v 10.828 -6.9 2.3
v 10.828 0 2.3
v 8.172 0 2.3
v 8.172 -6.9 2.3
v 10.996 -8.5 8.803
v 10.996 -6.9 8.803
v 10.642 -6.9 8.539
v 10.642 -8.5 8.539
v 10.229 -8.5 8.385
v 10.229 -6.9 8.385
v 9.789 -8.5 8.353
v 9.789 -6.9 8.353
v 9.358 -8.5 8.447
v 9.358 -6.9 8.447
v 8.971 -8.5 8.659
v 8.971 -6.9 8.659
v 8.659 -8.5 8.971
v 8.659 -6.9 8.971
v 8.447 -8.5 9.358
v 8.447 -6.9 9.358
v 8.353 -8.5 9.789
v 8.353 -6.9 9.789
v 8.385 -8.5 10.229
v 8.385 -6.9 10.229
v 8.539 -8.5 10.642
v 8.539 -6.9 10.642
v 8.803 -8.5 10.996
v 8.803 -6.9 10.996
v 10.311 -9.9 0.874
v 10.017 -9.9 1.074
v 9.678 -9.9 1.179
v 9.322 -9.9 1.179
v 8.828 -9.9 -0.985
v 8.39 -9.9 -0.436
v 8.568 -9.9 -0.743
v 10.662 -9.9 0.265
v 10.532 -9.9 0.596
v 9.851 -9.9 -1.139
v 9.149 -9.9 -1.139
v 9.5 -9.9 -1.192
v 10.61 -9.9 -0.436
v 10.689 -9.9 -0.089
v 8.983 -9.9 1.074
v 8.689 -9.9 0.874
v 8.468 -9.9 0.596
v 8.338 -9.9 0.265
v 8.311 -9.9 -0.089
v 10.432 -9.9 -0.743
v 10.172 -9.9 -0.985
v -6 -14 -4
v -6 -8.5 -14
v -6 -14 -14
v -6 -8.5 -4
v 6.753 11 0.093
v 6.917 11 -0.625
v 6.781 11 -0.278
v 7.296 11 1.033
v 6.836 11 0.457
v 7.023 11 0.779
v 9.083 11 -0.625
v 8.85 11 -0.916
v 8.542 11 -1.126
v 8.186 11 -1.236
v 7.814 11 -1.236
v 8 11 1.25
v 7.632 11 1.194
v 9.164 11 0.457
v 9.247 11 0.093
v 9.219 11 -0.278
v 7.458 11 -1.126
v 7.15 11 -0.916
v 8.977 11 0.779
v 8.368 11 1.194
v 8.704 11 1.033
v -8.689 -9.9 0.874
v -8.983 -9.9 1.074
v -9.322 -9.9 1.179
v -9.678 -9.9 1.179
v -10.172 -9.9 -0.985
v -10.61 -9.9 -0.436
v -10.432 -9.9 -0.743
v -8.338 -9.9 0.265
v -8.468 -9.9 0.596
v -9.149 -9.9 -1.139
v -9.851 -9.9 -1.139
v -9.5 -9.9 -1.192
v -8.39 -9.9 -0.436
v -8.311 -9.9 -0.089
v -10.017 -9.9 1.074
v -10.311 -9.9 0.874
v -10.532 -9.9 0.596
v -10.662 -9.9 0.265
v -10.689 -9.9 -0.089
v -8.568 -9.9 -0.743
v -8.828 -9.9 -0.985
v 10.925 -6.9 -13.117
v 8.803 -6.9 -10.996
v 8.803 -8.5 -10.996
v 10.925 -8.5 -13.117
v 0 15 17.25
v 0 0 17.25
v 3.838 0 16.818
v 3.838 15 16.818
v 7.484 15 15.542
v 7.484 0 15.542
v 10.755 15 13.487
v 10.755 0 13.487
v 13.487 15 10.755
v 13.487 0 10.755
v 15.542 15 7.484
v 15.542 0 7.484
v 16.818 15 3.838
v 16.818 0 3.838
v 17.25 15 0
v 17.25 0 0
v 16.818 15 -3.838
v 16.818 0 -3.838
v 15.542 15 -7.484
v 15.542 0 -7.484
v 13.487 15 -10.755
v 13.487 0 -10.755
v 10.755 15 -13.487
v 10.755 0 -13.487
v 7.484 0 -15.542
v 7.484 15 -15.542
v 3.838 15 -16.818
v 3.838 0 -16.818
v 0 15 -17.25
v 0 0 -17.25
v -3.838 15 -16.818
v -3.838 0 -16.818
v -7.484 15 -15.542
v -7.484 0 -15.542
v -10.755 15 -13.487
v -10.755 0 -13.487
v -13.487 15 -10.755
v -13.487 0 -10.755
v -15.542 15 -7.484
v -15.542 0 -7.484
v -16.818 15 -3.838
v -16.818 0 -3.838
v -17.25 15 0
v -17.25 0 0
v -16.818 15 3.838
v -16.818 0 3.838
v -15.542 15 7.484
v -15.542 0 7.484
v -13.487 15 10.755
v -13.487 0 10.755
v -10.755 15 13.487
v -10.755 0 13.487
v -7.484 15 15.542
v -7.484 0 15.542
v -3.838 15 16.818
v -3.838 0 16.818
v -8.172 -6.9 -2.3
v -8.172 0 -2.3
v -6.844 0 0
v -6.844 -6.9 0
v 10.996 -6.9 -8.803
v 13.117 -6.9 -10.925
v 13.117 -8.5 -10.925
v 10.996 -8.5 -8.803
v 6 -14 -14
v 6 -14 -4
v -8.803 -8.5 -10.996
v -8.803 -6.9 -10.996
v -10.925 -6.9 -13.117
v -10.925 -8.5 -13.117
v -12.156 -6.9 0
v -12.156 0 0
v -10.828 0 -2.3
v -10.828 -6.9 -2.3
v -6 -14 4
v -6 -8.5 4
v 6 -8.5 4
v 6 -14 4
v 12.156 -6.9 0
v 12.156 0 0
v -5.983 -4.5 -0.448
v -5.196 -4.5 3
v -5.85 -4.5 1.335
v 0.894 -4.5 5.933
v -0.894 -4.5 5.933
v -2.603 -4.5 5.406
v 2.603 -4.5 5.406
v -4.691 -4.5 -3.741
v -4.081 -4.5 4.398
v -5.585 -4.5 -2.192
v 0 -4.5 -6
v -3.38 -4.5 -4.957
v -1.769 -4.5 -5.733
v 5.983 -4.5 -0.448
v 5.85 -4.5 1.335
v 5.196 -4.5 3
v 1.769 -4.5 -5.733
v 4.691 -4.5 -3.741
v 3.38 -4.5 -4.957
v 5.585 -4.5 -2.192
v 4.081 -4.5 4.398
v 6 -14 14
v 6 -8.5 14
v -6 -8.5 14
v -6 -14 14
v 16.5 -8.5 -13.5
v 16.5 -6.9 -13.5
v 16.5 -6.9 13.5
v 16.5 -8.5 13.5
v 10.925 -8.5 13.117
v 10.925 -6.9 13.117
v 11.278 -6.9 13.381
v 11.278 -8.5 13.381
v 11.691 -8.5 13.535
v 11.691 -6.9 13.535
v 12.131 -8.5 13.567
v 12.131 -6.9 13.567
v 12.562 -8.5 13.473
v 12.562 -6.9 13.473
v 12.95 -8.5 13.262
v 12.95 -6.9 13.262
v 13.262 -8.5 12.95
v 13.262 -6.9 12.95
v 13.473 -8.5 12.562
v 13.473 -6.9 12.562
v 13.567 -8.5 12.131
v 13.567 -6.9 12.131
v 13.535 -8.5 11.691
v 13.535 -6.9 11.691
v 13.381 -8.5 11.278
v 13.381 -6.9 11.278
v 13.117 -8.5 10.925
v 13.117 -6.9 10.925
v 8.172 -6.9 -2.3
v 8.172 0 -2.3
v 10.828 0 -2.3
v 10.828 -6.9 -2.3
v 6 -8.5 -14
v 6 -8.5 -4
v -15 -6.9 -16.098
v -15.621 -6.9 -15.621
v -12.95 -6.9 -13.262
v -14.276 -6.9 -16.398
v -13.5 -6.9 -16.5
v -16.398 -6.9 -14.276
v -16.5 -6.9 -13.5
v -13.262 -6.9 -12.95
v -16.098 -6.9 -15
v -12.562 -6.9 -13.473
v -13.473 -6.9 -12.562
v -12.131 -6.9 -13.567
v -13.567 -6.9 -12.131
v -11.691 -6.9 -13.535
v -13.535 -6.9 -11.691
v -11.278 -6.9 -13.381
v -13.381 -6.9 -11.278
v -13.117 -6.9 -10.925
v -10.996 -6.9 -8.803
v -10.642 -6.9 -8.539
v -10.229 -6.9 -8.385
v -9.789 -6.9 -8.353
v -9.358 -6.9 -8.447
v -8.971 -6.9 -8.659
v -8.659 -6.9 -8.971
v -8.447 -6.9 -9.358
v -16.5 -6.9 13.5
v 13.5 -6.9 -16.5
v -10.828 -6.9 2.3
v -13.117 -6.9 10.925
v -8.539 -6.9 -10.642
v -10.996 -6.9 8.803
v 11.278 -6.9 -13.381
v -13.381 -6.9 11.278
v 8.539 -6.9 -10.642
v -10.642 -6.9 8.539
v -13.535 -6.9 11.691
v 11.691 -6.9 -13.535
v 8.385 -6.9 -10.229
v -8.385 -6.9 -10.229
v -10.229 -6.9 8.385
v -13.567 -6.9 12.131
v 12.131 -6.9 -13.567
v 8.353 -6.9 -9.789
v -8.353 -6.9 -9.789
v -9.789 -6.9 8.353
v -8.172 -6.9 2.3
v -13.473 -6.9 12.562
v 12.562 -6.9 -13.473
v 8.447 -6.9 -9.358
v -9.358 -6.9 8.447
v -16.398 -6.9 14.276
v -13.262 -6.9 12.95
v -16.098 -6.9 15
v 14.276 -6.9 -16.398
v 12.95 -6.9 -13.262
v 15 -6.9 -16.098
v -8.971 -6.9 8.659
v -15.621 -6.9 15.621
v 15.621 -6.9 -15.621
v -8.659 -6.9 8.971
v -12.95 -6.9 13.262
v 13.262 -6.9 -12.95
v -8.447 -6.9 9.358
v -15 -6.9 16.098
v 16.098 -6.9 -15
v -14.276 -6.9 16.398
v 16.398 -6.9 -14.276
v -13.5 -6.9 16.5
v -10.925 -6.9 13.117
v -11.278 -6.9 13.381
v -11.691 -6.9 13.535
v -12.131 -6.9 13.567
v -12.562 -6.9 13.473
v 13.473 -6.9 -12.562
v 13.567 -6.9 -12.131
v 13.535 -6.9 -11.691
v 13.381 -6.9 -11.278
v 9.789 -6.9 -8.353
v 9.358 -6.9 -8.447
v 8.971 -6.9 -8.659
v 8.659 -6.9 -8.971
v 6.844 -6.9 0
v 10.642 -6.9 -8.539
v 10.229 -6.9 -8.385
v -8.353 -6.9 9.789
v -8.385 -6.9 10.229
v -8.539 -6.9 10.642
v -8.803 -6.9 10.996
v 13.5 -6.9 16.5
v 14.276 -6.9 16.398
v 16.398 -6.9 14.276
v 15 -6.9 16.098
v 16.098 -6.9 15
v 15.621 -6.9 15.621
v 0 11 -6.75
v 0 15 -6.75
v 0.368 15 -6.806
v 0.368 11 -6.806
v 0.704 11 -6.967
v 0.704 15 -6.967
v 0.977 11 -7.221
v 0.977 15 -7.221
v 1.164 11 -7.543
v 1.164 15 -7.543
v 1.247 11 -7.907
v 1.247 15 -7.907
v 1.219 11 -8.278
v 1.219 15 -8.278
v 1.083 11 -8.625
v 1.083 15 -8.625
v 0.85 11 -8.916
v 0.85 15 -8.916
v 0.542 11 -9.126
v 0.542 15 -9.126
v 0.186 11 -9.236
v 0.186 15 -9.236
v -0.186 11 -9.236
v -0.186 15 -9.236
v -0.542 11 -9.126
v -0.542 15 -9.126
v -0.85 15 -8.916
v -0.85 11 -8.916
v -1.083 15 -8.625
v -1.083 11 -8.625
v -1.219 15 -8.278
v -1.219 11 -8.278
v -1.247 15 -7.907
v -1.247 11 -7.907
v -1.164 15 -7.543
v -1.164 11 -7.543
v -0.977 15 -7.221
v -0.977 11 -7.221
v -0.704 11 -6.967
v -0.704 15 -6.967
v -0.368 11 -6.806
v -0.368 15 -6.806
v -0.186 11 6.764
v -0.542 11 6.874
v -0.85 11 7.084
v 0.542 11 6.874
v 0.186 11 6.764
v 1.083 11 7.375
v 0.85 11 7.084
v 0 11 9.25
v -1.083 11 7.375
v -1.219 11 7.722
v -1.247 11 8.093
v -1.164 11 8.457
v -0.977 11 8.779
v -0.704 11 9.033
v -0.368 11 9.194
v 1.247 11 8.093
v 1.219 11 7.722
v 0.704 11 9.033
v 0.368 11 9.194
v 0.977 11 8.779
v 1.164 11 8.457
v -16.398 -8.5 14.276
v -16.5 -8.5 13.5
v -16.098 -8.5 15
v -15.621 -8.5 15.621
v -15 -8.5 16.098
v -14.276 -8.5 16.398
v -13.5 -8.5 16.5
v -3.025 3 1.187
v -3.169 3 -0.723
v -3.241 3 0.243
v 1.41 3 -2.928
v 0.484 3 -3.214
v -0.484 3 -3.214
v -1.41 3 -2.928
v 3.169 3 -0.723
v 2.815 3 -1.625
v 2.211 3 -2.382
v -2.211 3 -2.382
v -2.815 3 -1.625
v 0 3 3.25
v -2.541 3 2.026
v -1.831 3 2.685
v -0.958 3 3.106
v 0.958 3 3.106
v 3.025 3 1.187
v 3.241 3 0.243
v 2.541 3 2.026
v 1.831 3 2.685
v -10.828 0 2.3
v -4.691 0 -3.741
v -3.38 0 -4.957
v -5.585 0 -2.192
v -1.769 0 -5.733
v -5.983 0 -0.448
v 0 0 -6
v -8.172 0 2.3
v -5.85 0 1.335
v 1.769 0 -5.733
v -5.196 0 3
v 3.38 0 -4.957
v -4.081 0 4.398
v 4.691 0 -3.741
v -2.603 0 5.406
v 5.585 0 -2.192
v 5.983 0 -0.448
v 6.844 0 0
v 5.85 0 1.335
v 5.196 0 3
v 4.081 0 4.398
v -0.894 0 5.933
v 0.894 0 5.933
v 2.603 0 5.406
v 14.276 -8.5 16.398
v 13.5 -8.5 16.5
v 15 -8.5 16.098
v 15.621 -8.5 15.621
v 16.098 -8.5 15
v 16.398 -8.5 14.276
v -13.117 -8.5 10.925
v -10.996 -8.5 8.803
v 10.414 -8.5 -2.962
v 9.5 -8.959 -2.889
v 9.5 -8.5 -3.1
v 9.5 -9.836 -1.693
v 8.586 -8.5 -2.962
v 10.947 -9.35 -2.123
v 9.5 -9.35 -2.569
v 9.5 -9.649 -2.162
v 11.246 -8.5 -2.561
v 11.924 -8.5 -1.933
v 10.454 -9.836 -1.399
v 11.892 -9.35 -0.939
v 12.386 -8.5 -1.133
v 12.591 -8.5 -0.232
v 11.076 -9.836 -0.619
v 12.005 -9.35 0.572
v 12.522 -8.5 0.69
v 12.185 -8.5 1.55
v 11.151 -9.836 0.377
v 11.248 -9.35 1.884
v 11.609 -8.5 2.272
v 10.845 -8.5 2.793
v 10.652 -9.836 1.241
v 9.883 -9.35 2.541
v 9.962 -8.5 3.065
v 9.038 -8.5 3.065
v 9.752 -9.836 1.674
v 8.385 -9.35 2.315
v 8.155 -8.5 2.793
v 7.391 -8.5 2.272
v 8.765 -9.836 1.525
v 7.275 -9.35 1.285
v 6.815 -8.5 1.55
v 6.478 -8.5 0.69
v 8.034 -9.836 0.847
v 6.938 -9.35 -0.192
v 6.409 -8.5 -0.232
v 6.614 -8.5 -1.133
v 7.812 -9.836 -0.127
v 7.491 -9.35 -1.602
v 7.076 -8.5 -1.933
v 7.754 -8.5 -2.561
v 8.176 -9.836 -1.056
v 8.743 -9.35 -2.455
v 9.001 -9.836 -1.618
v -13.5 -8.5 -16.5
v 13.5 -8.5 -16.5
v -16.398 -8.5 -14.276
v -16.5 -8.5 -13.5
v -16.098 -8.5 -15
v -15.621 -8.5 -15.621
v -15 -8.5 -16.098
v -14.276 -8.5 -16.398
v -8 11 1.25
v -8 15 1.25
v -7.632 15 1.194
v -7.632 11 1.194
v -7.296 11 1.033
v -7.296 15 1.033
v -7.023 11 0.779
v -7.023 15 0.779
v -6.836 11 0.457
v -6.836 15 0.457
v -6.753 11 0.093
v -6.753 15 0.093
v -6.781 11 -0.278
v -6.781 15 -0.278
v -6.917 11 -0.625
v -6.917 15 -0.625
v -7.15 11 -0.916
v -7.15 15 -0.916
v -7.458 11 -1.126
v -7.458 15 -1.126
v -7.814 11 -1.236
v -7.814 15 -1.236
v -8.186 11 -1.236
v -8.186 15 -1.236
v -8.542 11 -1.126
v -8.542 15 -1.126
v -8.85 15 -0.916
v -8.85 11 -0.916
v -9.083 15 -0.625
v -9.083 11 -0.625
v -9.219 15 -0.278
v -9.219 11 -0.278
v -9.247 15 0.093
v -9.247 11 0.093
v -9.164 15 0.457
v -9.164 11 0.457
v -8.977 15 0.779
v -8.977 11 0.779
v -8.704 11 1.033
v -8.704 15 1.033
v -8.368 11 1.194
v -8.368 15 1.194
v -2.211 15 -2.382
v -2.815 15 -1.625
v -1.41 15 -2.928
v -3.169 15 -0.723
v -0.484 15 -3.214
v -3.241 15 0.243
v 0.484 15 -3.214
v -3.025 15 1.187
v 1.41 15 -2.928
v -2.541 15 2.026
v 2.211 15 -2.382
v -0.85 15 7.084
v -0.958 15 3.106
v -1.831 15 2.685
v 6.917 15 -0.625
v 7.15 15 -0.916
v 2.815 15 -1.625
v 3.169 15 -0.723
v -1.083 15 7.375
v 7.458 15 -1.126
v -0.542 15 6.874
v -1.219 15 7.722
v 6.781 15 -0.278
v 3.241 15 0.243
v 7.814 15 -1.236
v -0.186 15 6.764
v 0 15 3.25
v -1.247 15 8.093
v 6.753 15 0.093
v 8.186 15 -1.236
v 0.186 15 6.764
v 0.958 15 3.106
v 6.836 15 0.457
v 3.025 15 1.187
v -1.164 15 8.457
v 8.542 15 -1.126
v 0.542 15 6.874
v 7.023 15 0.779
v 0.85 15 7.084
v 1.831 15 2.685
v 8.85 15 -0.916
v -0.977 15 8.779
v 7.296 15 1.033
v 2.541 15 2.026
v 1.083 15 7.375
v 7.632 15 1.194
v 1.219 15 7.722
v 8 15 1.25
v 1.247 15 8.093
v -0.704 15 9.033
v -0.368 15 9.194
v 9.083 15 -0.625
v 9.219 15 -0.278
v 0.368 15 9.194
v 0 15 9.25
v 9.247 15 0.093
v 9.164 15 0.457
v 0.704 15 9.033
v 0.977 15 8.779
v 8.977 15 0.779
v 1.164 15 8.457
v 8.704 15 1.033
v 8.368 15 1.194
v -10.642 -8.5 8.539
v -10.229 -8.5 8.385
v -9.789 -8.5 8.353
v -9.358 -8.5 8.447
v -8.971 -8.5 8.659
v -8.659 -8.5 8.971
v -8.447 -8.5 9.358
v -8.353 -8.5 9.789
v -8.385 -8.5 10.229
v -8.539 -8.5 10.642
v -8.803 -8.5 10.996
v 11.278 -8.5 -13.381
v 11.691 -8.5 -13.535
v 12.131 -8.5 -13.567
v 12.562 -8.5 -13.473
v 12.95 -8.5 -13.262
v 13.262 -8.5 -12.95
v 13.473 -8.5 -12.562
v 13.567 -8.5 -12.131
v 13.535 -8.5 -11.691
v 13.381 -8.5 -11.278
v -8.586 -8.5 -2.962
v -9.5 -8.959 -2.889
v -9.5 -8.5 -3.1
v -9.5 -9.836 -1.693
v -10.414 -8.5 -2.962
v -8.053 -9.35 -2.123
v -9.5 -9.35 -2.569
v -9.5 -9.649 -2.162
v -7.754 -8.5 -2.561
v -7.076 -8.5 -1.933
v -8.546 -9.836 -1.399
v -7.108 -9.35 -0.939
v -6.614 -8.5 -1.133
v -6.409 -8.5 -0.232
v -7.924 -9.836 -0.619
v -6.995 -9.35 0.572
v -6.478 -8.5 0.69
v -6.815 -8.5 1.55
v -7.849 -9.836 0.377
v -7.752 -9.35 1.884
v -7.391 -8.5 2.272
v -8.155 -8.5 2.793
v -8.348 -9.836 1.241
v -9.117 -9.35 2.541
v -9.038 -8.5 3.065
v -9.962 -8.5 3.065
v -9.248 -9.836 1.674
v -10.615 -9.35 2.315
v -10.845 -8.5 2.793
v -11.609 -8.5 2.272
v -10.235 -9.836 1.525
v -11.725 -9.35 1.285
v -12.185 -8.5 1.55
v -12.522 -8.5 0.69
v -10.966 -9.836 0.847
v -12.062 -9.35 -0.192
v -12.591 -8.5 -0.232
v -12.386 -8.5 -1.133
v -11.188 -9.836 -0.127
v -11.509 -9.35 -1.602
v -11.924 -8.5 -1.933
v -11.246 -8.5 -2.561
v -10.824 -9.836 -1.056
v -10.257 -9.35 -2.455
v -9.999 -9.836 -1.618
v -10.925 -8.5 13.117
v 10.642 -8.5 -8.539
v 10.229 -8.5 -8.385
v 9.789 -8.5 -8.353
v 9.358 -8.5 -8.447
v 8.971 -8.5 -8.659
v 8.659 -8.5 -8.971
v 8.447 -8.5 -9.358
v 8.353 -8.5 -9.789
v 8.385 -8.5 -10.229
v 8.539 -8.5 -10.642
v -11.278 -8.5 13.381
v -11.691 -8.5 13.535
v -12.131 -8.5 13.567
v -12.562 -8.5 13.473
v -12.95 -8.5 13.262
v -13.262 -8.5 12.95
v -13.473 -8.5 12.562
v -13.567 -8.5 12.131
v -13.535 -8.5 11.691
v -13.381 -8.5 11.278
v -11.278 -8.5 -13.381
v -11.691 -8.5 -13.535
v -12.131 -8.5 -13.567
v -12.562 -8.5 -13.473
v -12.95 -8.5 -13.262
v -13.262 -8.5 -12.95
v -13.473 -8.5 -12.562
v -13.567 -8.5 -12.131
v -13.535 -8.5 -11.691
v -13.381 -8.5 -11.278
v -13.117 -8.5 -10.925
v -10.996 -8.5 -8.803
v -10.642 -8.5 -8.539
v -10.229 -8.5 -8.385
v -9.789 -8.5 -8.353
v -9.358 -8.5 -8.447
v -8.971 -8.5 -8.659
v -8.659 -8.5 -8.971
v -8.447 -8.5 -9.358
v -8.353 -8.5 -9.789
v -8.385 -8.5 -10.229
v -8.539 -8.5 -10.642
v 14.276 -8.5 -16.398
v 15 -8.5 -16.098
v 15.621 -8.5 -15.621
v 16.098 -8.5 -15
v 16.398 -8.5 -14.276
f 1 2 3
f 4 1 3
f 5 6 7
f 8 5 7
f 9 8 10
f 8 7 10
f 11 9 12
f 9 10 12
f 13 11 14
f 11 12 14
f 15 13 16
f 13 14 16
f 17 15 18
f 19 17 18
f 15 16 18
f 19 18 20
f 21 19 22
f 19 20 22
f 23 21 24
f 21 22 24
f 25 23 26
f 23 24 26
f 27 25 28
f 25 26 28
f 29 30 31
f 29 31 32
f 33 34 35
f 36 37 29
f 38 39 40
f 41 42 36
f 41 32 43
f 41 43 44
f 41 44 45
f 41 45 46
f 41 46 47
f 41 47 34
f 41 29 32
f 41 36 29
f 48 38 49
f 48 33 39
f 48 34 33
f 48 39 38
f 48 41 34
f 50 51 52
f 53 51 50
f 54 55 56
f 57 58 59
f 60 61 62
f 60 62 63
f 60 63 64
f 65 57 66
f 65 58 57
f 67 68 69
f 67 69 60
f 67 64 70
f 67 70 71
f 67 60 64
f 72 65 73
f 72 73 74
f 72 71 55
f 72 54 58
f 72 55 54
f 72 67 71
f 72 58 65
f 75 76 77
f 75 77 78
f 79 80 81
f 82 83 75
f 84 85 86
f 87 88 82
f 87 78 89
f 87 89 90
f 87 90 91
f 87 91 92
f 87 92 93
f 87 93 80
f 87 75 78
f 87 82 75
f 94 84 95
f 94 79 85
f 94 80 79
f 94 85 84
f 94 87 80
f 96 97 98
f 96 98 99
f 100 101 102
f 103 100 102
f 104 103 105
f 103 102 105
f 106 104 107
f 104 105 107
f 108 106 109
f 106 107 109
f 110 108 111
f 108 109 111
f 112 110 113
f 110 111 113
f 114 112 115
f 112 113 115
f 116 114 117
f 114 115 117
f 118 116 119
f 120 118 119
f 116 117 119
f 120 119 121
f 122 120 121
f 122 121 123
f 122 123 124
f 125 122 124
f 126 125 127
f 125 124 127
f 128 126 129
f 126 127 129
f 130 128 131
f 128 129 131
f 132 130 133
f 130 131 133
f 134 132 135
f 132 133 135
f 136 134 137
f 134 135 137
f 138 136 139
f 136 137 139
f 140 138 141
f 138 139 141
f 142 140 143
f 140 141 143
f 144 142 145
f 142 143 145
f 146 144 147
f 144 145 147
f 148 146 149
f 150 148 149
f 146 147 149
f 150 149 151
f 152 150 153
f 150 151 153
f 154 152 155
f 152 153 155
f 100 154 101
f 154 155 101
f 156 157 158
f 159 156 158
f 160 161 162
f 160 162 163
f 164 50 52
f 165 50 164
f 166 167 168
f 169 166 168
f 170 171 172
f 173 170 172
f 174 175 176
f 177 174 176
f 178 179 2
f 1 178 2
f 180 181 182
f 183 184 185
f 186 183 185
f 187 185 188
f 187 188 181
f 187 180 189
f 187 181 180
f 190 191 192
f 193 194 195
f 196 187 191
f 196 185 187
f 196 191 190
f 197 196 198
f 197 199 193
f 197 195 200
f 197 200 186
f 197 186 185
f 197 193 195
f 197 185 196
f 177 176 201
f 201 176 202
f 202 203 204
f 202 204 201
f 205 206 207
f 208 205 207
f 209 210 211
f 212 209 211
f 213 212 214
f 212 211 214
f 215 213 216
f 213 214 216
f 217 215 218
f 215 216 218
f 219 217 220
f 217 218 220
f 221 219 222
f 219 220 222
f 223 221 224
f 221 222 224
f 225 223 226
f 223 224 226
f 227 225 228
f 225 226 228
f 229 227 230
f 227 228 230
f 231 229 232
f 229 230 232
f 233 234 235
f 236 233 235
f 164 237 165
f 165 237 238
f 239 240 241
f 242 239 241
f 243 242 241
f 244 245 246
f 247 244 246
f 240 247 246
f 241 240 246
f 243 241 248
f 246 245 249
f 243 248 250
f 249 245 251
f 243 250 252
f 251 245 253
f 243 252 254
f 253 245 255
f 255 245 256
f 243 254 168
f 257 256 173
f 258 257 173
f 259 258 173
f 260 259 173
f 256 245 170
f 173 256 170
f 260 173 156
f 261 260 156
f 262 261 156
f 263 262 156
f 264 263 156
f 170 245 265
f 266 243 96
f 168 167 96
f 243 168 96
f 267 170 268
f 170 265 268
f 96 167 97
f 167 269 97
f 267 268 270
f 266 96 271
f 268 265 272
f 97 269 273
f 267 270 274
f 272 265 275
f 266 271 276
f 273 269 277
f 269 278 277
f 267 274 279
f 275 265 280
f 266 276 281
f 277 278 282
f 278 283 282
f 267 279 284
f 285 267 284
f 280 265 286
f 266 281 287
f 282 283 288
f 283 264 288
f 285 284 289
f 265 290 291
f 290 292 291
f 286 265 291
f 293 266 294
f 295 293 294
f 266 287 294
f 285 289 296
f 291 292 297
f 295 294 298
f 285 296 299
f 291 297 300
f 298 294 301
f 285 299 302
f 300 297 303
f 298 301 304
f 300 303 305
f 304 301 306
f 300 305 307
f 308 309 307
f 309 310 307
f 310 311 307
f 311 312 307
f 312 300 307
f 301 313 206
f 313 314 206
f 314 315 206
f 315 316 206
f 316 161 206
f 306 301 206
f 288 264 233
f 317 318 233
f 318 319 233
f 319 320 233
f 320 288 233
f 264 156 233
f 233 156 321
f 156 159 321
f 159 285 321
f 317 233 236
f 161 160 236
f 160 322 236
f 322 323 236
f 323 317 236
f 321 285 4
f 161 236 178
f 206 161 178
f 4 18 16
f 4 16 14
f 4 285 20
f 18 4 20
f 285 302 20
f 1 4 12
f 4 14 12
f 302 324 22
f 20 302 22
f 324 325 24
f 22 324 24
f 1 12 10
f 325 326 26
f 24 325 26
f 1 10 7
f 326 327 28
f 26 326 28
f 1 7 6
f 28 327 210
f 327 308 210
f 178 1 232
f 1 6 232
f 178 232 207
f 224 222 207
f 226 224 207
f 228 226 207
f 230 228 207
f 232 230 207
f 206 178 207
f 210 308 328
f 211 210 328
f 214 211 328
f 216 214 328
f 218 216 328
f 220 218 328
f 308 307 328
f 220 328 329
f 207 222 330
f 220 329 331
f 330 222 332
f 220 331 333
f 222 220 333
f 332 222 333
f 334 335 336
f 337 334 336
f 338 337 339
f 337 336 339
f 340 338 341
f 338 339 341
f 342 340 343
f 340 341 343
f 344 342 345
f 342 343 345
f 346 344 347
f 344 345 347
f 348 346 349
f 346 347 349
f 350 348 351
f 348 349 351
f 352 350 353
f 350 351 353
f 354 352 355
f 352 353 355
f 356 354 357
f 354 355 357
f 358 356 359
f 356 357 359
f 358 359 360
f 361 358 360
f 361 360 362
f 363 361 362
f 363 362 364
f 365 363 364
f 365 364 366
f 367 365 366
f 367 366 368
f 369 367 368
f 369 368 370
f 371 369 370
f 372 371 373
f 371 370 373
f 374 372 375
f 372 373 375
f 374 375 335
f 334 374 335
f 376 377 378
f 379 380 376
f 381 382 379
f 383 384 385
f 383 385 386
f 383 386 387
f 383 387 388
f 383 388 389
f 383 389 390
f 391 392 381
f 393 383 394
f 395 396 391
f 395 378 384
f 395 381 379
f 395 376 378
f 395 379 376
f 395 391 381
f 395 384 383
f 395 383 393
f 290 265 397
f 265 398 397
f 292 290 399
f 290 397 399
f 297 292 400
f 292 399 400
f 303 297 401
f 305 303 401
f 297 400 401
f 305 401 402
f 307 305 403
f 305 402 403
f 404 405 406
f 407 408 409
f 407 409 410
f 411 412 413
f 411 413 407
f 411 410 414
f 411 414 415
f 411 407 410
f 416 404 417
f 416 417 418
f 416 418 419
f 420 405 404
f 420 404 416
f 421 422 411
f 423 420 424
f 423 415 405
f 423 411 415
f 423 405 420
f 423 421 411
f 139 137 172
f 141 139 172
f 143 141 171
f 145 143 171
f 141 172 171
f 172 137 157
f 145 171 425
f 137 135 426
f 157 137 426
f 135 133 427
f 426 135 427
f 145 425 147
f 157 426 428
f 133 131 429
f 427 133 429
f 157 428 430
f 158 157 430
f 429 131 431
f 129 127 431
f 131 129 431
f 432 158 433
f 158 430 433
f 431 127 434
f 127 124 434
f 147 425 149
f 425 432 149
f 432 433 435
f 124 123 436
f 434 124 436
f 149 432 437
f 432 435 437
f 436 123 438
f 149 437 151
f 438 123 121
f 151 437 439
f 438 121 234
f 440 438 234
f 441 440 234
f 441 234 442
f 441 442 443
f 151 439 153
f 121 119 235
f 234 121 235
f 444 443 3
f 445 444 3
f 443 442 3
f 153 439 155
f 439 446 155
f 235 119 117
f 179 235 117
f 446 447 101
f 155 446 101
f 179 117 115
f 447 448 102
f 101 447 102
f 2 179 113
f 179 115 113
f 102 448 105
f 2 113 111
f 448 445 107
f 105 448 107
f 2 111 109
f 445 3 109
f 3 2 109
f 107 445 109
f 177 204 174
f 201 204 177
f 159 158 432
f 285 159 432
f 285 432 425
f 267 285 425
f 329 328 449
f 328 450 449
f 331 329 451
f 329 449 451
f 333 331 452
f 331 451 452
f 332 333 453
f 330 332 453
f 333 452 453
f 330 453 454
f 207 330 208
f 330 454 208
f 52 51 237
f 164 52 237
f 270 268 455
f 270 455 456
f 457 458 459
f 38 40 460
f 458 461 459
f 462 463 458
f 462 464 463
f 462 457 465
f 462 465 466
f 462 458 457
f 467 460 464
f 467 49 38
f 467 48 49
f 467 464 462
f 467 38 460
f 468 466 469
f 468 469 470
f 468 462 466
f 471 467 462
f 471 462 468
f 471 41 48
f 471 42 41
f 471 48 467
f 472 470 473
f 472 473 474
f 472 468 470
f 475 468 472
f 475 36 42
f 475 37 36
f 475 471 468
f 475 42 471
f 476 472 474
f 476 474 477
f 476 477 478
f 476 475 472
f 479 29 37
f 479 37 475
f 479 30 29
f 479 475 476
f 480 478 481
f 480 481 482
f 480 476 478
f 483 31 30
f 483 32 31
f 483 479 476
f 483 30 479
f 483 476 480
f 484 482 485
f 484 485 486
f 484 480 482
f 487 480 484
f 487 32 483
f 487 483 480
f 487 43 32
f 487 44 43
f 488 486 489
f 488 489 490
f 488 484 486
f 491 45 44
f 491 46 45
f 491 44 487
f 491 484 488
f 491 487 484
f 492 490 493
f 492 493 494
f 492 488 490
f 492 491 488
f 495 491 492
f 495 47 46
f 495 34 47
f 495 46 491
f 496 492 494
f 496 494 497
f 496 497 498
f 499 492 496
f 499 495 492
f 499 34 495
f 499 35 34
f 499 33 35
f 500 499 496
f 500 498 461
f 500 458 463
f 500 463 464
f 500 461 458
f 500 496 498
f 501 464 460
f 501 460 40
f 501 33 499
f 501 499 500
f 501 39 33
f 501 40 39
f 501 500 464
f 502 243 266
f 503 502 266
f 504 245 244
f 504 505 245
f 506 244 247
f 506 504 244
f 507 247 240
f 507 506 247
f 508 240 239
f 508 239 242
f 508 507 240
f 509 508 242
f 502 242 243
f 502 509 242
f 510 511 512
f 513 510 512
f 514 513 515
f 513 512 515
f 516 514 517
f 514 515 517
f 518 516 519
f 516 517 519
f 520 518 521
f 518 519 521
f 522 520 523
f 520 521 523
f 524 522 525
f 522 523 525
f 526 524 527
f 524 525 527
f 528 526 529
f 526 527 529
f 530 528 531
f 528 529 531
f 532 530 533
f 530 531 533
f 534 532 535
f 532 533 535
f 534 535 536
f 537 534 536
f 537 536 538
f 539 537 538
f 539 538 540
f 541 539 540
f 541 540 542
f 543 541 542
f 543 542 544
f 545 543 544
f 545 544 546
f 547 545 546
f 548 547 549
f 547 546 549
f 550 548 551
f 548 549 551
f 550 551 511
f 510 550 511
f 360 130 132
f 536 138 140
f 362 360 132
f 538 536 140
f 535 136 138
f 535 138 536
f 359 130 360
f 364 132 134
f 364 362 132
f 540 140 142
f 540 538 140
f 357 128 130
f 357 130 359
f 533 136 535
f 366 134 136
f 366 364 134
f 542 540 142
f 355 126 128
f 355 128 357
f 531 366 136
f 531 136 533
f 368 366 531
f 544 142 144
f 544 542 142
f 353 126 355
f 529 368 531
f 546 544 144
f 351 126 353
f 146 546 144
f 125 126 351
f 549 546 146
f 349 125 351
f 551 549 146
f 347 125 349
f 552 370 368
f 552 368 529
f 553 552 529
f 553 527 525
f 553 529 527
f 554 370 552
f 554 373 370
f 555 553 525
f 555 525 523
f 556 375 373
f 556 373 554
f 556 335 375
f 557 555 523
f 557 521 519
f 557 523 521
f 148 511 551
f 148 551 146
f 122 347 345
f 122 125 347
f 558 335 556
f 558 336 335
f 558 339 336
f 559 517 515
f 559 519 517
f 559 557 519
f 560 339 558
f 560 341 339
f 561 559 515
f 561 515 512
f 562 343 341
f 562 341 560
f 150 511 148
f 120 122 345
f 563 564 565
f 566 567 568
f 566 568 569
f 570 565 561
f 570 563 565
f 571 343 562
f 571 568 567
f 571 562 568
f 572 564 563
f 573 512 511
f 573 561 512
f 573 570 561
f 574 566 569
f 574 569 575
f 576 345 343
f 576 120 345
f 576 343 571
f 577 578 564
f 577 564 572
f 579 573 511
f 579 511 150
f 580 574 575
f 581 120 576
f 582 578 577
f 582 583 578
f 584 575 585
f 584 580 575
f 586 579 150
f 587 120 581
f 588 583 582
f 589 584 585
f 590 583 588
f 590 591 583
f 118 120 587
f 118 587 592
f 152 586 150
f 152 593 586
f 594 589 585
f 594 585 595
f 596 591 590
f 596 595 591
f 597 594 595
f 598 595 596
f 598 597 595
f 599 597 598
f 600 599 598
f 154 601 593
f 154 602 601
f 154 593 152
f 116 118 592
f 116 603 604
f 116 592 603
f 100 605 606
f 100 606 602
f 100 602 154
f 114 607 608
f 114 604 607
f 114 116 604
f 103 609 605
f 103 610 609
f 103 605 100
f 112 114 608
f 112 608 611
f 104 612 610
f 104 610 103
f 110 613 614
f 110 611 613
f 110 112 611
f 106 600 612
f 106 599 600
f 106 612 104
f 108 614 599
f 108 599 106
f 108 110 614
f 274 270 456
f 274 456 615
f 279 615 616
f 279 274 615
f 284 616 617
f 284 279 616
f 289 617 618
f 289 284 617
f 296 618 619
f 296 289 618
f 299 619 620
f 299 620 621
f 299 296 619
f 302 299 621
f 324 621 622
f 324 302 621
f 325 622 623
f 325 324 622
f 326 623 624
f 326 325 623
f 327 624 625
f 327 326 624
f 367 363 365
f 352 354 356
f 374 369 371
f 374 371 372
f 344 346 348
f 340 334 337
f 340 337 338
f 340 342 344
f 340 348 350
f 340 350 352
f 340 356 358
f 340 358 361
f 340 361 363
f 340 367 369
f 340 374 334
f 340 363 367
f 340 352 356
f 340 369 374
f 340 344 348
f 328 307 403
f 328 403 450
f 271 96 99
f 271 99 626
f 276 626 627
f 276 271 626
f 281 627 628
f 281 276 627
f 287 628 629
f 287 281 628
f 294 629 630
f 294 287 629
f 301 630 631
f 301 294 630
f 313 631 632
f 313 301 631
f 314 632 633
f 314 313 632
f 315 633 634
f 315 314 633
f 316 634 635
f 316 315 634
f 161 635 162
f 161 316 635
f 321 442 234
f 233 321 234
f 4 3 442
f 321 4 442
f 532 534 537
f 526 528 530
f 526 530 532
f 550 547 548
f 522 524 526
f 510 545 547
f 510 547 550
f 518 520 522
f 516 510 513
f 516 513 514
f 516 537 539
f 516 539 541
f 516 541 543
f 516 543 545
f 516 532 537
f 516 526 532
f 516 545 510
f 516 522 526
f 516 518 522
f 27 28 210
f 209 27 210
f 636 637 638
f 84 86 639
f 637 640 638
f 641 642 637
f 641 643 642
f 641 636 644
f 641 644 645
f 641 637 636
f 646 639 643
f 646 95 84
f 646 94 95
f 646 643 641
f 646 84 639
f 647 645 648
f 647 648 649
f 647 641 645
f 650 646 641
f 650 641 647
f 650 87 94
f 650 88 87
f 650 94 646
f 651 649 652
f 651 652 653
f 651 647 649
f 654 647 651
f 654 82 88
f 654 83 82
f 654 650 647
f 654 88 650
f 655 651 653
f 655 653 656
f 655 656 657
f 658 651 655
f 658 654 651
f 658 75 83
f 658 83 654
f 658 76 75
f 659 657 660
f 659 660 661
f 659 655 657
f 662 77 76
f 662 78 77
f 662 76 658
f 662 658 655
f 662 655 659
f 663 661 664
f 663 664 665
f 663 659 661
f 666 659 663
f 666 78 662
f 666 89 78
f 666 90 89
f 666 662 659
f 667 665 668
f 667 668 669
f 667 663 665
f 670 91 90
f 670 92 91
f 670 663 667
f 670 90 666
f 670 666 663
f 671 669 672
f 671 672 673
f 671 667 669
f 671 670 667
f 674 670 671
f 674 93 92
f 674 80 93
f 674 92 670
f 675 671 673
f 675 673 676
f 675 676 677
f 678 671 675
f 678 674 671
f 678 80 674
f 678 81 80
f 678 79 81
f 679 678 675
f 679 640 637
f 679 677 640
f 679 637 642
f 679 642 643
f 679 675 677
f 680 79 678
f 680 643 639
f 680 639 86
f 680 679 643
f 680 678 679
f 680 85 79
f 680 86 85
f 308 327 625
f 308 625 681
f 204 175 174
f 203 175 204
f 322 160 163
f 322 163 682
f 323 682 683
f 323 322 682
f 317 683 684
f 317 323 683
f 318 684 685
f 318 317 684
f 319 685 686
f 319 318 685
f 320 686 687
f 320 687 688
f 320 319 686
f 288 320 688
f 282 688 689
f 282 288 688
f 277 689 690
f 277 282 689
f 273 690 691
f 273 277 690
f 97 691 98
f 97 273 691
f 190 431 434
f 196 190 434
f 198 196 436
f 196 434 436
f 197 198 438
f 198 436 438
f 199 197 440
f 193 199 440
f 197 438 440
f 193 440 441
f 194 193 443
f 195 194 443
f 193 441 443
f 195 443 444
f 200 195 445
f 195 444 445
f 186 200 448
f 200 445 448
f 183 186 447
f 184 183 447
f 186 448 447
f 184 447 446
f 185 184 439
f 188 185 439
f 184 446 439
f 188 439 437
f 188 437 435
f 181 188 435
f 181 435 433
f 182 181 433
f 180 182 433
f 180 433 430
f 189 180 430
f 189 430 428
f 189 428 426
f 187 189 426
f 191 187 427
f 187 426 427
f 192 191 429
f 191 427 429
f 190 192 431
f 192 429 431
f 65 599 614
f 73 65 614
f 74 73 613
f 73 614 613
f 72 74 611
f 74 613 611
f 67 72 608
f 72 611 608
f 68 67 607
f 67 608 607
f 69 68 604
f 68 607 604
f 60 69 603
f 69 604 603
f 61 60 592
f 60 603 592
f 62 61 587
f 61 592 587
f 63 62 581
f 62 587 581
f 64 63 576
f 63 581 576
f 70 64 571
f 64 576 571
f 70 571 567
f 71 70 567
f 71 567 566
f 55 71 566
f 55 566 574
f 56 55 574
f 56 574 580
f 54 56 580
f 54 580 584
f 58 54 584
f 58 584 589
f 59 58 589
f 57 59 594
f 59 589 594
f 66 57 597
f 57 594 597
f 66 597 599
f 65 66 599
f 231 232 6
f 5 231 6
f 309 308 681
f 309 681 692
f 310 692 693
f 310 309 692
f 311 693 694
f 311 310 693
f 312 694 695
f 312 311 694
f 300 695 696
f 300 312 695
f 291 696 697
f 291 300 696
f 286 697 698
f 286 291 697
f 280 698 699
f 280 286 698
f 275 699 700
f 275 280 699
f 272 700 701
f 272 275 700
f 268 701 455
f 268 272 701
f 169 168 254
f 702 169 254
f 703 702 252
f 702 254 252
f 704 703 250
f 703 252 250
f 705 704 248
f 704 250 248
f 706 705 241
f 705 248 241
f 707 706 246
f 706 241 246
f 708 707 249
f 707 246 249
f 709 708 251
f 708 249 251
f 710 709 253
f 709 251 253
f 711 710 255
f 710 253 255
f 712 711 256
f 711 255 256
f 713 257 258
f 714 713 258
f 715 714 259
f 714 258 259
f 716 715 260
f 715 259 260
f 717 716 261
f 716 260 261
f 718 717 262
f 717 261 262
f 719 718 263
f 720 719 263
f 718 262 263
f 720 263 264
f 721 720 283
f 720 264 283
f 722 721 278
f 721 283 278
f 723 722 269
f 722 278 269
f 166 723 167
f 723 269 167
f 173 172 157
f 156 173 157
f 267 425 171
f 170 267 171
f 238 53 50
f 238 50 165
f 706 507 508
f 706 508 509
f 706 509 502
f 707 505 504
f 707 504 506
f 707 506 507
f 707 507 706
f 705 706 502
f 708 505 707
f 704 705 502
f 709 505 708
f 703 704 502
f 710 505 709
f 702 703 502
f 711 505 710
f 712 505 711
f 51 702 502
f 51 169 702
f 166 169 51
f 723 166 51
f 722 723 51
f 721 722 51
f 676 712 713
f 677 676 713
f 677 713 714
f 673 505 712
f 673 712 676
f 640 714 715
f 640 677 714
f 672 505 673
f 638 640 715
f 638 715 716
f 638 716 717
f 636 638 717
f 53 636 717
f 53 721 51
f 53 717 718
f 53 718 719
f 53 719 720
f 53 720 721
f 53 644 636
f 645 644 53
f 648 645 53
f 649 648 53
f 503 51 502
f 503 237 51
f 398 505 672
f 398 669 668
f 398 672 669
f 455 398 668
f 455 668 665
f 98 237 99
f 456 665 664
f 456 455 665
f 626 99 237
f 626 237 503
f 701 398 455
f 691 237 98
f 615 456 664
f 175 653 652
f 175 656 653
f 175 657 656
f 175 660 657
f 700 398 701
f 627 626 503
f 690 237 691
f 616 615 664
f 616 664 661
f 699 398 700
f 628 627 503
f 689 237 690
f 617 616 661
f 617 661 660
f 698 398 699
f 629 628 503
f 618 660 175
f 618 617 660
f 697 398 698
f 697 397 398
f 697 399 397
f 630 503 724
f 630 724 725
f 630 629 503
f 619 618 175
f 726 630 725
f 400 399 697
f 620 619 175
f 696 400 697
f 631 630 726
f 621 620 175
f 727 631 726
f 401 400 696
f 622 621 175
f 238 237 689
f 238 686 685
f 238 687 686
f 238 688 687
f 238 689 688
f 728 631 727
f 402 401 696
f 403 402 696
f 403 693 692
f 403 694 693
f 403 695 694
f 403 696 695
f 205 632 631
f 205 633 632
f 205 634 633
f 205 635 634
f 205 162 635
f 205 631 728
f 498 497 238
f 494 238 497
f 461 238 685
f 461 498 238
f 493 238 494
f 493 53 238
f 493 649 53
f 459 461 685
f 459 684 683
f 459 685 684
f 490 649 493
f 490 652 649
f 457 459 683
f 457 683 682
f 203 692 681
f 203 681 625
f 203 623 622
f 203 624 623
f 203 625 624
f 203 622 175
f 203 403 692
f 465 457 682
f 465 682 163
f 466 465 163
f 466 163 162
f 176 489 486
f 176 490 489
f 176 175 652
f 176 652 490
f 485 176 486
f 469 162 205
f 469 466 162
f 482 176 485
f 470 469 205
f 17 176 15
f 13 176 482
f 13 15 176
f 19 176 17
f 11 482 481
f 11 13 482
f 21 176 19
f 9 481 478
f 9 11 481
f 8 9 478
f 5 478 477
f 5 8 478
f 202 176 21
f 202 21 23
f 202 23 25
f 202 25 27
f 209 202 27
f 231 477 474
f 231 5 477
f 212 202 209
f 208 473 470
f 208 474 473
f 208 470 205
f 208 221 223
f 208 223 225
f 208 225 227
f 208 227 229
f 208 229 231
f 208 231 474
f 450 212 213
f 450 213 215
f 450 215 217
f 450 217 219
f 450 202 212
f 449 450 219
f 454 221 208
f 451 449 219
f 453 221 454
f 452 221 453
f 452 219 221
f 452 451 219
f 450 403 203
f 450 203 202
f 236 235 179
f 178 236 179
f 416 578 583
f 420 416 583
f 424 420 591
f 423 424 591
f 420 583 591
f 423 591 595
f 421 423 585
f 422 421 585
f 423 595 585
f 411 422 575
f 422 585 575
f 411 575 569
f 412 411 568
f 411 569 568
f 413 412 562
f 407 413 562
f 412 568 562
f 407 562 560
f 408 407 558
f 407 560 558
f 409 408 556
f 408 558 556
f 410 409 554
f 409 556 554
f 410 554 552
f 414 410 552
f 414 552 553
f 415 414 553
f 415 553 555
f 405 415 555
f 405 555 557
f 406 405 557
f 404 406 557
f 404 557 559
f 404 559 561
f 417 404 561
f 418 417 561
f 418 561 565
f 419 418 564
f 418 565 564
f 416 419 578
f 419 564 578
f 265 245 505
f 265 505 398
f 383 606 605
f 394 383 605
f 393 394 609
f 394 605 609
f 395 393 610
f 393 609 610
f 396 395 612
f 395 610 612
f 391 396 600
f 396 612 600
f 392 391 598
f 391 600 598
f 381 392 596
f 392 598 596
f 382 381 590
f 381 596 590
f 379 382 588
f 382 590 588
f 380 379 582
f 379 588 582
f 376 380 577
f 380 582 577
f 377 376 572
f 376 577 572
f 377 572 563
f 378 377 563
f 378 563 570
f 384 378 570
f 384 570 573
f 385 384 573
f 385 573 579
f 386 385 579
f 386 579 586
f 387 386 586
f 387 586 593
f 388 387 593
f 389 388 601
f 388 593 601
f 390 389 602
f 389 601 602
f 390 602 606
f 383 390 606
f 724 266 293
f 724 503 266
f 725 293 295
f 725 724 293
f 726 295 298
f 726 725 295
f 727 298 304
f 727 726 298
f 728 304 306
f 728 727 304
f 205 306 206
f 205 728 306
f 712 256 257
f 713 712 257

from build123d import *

# Parameters (mm, degrees)
SKETCH1_R           = 17.25
BOSS_EXTRUDE1_DEPTH = 15
SKETCH2_R           = 6
BOSS_EXTRUDE2_DEPTH = 4.5
BOSS_EXTRUDE3_DEPTH = 6.9
SKETCH4_W           = 33
SKETCH4_H           = 33
BOSS_EXTRUDE4_DEPTH = 1.6
FILLET1_R           = 3
SKETCH9_W           = 12
SKETCH9_H           = 10
BOSS_EXTRUDE6_DEPTH = 5.5
SKETCH10_R          = 1.25
CUT_EXTRUDE1_DEPTH  = 4
SKETCH11_R          = 3.1
BOSS_EXTRUDE7_DEPTH = 1.4
FILLET2_R           = 2
SKETCH12_R          = 3.25
CUT_EXTRUDE2_DEPTH  = 12


with BuildPart() as part:
    # Sketch1 → Boss-Extrude1 (new body)
    with BuildSketch(Plane(origin=(0, 0, 0), x_dir=(1, 0, 0), z_dir=(0, 1, 0))):
        with Locations(Location((0, 0, 0), (0, 0, 270))):
            Circle(SKETCH1_R)
    extrude(amount=BOSS_EXTRUDE1_DEPTH)

    # Sketch2 → Boss-Extrude2 (add)
    with BuildSketch(Plane.XZ):
        with Locations(Location((0, 0, 0), (0, 0, 270))):
            Circle(SKETCH2_R)
    extrude(amount=BOSS_EXTRUDE2_DEPTH)

    # Sketch3 → Boss-Extrude3 (add)
    with BuildSketch(Plane.XZ):
        Polygon((-6.844188762, 0), (-8.172094381, 2.3), (-10.827905619, 2.3), (-12.155811238, 0), (-10.827905619, -2.3), (-8.172094381, -2.3), align=None)
        Polygon((12.155811238, 0), (10.827905619, 2.3), (8.172094381, 2.3), (6.844188762, 0), (8.172094381, -2.3), (10.827905619, -2.3), align=None)
    extrude(amount=BOSS_EXTRUDE3_DEPTH)

    # Sketch4 → Boss-Extrude4 (add)
    with BuildSketch(Plane.XZ.offset(6.9)):
        Rectangle(SKETCH4_W, SKETCH4_H)
        with BuildLine():
            Line((-13.116830791, -10.924799769), (-10.995510447, -8.803479426))
            ThreePointArc((-10.995510447, -8.803479426), (-8.803479426, -8.803479426), (-8.803479426, -10.995510447))
            Line((-8.803479426, -10.995510447), (-10.924799769, -13.116830791))
            ThreePointArc((-10.924799769, -13.116830791), (-13.116830791, -13.116830791), (-13.116830791, -10.924799769))
        make_face(mode=Mode.SUBTRACT)
        with BuildLine():
            Line((-13.116830791, 10.924799769), (-10.995510447, 8.803479426))
            ThreePointArc((-10.995510447, 8.803479426), (-8.803479426, 8.803479426), (-8.803479426, 10.995510447))
            Line((-8.803479426, 10.995510447), (-10.924799769, 13.116830791))
            ThreePointArc((-10.924799769, 13.116830791), (-13.116830791, 13.116830791), (-13.116830791, 10.924799769))
        make_face(mode=Mode.SUBTRACT)
        with BuildLine():
            Line((13.116830791, -10.924799769), (10.995510447, -8.803479426))
            ThreePointArc((10.995510447, -8.803479426), (8.803479426, -8.803479426), (8.803479426, -10.995510447))
            Line((8.803479426, -10.995510447), (10.924799769, -13.116830791))
            ThreePointArc((10.924799769, -13.116830791), (13.116830791, -13.116830791), (13.116830791, -10.924799769))
        make_face(mode=Mode.SUBTRACT)
        with BuildLine():
            Line((13.116830791, 10.924799769), (10.995510447, 8.803479426))
            ThreePointArc((10.995510447, 8.803479426), (8.803479426, 8.803479426), (8.803479426, 10.995510447))
            Line((8.803479426, 10.995510447), (10.924799769, 13.116830791))
            ThreePointArc((10.924799769, 13.116830791), (13.116830791, 13.116830791), (13.116830791, 10.924799769))
        make_face(mode=Mode.SUBTRACT)
    extrude(amount=BOSS_EXTRUDE4_DEPTH)

    # Fillet1
    fillet1_edges = [part.edges().sort_by_distance(p)[0] for p in [
        (-16.5, -7.7, -16.5),
        (16.5, -7.7, -16.5),
        (16.5, -7.7, 16.5),
        (-16.5, -7.7, 16.5),
    ]]
    fillet(fillet1_edges, radius=FILLET1_R)

    # Sketch9 → Boss-Extrude6 (add)
    with BuildSketch(Plane.XZ.offset(8.5)):
        with Locations((0, 9)):
            Rectangle(SKETCH9_W, SKETCH9_H)
        with Locations((0, -9)):
            Rectangle(SKETCH9_W, SKETCH9_H)
    extrude(amount=BOSS_EXTRUDE6_DEPTH)

    # Sketch10 → Cut-Extrude1 (cut)
    with BuildSketch(Plane(origin=(0, 15, 0), x_dir=(1, 0, 0), z_dir=(0, 1, 0))):
        with Locations(Location((0, 8, 0), (0, 0, 270))):
            Circle(SKETCH10_R)
        with Locations(Location((8, 0, 0), (0, 0, 270))):
            Circle(SKETCH10_R)
        with Locations(Location((0, -8, 0), (0, 0, 270))):
            Circle(SKETCH10_R)
        with Locations(Location((-8, 0, 0), (0, 0, 270))):
            Circle(SKETCH10_R)
    extrude(amount=-CUT_EXTRUDE1_DEPTH, mode=Mode.SUBTRACT)

    # Sketch11 → Boss-Extrude7 (add)
    with BuildSketch(Plane.XZ.offset(8.5)):
        with Locations(Location((-9.5, 0, 0), (0, 0, 270))):
            Circle(SKETCH11_R)
        with Locations(Location((9.5, 0, 0), (0, 0, 270))):
            Circle(SKETCH11_R)
    extrude(amount=BOSS_EXTRUDE7_DEPTH)

    # Fillet2
    # the kernel refuses this fillet: 2 mm, written as the material it takes off along each edge
    with BuildSketch(Plane(origin=(-9.5, -9.9, 0), x_dir=(0, 0, -1), z_dir=(-1, 0, 0))) as fillet2_piece_1:
        with BuildLine():
            CenterArc((1.192121597, -2), FILLET2_R, 17.457603124, 72.542396876)
            Line((1.192121597, 0), (1.192121597, 0.04))
            Line((1.192121597, 0.04), (3.1, 0.04))
            Line((3.1, 0.04), (3.14, 0))
            ThreePointArc((3.14, 0), (3.14, -0.7), (3.138157568, -1.388))
            Line((3.138157568, -1.388), (3.1, -1.4))
        make_face()
    revolve(axis=Axis((-9.5, -9.9, 0), (0, -1, 0)), mode=Mode.SUBTRACT)
    with BuildSketch(Plane(origin=(9.5, -9.9, 0), x_dir=(0, 0, -1), z_dir=(-1, 0, 0))) as fillet2_piece_2:
        with BuildLine():
            CenterArc((1.192121597, -2), FILLET2_R, 17.457603124, 72.542396876)
            Line((1.192121597, 0), (1.192121597, 0.04))
            Line((1.192121597, 0.04), (3.1, 0.04))
            Line((3.1, 0.04), (3.14, 0))
            ThreePointArc((3.14, 0), (3.14, -0.7), (3.138157568, -1.388))
            Line((3.138157568, -1.388), (3.1, -1.4))
        make_face()
    revolve(axis=Axis((9.5, -9.9, 0), (0, -1, 0)), mode=Mode.SUBTRACT)

    # Sketch12 → Cut-Extrude2 (cut)
    with BuildSketch(Plane(origin=(0, 15, 0), x_dir=(1, 0, 0), z_dir=(0, 1, 0))):
        with Locations(Location((0, 0, 0), (0, 0, 270))):
            Circle(SKETCH12_R)
    extrude(amount=-CUT_EXTRUDE2_DEPTH, mode=Mode.SUBTRACT)


solid = part.part
